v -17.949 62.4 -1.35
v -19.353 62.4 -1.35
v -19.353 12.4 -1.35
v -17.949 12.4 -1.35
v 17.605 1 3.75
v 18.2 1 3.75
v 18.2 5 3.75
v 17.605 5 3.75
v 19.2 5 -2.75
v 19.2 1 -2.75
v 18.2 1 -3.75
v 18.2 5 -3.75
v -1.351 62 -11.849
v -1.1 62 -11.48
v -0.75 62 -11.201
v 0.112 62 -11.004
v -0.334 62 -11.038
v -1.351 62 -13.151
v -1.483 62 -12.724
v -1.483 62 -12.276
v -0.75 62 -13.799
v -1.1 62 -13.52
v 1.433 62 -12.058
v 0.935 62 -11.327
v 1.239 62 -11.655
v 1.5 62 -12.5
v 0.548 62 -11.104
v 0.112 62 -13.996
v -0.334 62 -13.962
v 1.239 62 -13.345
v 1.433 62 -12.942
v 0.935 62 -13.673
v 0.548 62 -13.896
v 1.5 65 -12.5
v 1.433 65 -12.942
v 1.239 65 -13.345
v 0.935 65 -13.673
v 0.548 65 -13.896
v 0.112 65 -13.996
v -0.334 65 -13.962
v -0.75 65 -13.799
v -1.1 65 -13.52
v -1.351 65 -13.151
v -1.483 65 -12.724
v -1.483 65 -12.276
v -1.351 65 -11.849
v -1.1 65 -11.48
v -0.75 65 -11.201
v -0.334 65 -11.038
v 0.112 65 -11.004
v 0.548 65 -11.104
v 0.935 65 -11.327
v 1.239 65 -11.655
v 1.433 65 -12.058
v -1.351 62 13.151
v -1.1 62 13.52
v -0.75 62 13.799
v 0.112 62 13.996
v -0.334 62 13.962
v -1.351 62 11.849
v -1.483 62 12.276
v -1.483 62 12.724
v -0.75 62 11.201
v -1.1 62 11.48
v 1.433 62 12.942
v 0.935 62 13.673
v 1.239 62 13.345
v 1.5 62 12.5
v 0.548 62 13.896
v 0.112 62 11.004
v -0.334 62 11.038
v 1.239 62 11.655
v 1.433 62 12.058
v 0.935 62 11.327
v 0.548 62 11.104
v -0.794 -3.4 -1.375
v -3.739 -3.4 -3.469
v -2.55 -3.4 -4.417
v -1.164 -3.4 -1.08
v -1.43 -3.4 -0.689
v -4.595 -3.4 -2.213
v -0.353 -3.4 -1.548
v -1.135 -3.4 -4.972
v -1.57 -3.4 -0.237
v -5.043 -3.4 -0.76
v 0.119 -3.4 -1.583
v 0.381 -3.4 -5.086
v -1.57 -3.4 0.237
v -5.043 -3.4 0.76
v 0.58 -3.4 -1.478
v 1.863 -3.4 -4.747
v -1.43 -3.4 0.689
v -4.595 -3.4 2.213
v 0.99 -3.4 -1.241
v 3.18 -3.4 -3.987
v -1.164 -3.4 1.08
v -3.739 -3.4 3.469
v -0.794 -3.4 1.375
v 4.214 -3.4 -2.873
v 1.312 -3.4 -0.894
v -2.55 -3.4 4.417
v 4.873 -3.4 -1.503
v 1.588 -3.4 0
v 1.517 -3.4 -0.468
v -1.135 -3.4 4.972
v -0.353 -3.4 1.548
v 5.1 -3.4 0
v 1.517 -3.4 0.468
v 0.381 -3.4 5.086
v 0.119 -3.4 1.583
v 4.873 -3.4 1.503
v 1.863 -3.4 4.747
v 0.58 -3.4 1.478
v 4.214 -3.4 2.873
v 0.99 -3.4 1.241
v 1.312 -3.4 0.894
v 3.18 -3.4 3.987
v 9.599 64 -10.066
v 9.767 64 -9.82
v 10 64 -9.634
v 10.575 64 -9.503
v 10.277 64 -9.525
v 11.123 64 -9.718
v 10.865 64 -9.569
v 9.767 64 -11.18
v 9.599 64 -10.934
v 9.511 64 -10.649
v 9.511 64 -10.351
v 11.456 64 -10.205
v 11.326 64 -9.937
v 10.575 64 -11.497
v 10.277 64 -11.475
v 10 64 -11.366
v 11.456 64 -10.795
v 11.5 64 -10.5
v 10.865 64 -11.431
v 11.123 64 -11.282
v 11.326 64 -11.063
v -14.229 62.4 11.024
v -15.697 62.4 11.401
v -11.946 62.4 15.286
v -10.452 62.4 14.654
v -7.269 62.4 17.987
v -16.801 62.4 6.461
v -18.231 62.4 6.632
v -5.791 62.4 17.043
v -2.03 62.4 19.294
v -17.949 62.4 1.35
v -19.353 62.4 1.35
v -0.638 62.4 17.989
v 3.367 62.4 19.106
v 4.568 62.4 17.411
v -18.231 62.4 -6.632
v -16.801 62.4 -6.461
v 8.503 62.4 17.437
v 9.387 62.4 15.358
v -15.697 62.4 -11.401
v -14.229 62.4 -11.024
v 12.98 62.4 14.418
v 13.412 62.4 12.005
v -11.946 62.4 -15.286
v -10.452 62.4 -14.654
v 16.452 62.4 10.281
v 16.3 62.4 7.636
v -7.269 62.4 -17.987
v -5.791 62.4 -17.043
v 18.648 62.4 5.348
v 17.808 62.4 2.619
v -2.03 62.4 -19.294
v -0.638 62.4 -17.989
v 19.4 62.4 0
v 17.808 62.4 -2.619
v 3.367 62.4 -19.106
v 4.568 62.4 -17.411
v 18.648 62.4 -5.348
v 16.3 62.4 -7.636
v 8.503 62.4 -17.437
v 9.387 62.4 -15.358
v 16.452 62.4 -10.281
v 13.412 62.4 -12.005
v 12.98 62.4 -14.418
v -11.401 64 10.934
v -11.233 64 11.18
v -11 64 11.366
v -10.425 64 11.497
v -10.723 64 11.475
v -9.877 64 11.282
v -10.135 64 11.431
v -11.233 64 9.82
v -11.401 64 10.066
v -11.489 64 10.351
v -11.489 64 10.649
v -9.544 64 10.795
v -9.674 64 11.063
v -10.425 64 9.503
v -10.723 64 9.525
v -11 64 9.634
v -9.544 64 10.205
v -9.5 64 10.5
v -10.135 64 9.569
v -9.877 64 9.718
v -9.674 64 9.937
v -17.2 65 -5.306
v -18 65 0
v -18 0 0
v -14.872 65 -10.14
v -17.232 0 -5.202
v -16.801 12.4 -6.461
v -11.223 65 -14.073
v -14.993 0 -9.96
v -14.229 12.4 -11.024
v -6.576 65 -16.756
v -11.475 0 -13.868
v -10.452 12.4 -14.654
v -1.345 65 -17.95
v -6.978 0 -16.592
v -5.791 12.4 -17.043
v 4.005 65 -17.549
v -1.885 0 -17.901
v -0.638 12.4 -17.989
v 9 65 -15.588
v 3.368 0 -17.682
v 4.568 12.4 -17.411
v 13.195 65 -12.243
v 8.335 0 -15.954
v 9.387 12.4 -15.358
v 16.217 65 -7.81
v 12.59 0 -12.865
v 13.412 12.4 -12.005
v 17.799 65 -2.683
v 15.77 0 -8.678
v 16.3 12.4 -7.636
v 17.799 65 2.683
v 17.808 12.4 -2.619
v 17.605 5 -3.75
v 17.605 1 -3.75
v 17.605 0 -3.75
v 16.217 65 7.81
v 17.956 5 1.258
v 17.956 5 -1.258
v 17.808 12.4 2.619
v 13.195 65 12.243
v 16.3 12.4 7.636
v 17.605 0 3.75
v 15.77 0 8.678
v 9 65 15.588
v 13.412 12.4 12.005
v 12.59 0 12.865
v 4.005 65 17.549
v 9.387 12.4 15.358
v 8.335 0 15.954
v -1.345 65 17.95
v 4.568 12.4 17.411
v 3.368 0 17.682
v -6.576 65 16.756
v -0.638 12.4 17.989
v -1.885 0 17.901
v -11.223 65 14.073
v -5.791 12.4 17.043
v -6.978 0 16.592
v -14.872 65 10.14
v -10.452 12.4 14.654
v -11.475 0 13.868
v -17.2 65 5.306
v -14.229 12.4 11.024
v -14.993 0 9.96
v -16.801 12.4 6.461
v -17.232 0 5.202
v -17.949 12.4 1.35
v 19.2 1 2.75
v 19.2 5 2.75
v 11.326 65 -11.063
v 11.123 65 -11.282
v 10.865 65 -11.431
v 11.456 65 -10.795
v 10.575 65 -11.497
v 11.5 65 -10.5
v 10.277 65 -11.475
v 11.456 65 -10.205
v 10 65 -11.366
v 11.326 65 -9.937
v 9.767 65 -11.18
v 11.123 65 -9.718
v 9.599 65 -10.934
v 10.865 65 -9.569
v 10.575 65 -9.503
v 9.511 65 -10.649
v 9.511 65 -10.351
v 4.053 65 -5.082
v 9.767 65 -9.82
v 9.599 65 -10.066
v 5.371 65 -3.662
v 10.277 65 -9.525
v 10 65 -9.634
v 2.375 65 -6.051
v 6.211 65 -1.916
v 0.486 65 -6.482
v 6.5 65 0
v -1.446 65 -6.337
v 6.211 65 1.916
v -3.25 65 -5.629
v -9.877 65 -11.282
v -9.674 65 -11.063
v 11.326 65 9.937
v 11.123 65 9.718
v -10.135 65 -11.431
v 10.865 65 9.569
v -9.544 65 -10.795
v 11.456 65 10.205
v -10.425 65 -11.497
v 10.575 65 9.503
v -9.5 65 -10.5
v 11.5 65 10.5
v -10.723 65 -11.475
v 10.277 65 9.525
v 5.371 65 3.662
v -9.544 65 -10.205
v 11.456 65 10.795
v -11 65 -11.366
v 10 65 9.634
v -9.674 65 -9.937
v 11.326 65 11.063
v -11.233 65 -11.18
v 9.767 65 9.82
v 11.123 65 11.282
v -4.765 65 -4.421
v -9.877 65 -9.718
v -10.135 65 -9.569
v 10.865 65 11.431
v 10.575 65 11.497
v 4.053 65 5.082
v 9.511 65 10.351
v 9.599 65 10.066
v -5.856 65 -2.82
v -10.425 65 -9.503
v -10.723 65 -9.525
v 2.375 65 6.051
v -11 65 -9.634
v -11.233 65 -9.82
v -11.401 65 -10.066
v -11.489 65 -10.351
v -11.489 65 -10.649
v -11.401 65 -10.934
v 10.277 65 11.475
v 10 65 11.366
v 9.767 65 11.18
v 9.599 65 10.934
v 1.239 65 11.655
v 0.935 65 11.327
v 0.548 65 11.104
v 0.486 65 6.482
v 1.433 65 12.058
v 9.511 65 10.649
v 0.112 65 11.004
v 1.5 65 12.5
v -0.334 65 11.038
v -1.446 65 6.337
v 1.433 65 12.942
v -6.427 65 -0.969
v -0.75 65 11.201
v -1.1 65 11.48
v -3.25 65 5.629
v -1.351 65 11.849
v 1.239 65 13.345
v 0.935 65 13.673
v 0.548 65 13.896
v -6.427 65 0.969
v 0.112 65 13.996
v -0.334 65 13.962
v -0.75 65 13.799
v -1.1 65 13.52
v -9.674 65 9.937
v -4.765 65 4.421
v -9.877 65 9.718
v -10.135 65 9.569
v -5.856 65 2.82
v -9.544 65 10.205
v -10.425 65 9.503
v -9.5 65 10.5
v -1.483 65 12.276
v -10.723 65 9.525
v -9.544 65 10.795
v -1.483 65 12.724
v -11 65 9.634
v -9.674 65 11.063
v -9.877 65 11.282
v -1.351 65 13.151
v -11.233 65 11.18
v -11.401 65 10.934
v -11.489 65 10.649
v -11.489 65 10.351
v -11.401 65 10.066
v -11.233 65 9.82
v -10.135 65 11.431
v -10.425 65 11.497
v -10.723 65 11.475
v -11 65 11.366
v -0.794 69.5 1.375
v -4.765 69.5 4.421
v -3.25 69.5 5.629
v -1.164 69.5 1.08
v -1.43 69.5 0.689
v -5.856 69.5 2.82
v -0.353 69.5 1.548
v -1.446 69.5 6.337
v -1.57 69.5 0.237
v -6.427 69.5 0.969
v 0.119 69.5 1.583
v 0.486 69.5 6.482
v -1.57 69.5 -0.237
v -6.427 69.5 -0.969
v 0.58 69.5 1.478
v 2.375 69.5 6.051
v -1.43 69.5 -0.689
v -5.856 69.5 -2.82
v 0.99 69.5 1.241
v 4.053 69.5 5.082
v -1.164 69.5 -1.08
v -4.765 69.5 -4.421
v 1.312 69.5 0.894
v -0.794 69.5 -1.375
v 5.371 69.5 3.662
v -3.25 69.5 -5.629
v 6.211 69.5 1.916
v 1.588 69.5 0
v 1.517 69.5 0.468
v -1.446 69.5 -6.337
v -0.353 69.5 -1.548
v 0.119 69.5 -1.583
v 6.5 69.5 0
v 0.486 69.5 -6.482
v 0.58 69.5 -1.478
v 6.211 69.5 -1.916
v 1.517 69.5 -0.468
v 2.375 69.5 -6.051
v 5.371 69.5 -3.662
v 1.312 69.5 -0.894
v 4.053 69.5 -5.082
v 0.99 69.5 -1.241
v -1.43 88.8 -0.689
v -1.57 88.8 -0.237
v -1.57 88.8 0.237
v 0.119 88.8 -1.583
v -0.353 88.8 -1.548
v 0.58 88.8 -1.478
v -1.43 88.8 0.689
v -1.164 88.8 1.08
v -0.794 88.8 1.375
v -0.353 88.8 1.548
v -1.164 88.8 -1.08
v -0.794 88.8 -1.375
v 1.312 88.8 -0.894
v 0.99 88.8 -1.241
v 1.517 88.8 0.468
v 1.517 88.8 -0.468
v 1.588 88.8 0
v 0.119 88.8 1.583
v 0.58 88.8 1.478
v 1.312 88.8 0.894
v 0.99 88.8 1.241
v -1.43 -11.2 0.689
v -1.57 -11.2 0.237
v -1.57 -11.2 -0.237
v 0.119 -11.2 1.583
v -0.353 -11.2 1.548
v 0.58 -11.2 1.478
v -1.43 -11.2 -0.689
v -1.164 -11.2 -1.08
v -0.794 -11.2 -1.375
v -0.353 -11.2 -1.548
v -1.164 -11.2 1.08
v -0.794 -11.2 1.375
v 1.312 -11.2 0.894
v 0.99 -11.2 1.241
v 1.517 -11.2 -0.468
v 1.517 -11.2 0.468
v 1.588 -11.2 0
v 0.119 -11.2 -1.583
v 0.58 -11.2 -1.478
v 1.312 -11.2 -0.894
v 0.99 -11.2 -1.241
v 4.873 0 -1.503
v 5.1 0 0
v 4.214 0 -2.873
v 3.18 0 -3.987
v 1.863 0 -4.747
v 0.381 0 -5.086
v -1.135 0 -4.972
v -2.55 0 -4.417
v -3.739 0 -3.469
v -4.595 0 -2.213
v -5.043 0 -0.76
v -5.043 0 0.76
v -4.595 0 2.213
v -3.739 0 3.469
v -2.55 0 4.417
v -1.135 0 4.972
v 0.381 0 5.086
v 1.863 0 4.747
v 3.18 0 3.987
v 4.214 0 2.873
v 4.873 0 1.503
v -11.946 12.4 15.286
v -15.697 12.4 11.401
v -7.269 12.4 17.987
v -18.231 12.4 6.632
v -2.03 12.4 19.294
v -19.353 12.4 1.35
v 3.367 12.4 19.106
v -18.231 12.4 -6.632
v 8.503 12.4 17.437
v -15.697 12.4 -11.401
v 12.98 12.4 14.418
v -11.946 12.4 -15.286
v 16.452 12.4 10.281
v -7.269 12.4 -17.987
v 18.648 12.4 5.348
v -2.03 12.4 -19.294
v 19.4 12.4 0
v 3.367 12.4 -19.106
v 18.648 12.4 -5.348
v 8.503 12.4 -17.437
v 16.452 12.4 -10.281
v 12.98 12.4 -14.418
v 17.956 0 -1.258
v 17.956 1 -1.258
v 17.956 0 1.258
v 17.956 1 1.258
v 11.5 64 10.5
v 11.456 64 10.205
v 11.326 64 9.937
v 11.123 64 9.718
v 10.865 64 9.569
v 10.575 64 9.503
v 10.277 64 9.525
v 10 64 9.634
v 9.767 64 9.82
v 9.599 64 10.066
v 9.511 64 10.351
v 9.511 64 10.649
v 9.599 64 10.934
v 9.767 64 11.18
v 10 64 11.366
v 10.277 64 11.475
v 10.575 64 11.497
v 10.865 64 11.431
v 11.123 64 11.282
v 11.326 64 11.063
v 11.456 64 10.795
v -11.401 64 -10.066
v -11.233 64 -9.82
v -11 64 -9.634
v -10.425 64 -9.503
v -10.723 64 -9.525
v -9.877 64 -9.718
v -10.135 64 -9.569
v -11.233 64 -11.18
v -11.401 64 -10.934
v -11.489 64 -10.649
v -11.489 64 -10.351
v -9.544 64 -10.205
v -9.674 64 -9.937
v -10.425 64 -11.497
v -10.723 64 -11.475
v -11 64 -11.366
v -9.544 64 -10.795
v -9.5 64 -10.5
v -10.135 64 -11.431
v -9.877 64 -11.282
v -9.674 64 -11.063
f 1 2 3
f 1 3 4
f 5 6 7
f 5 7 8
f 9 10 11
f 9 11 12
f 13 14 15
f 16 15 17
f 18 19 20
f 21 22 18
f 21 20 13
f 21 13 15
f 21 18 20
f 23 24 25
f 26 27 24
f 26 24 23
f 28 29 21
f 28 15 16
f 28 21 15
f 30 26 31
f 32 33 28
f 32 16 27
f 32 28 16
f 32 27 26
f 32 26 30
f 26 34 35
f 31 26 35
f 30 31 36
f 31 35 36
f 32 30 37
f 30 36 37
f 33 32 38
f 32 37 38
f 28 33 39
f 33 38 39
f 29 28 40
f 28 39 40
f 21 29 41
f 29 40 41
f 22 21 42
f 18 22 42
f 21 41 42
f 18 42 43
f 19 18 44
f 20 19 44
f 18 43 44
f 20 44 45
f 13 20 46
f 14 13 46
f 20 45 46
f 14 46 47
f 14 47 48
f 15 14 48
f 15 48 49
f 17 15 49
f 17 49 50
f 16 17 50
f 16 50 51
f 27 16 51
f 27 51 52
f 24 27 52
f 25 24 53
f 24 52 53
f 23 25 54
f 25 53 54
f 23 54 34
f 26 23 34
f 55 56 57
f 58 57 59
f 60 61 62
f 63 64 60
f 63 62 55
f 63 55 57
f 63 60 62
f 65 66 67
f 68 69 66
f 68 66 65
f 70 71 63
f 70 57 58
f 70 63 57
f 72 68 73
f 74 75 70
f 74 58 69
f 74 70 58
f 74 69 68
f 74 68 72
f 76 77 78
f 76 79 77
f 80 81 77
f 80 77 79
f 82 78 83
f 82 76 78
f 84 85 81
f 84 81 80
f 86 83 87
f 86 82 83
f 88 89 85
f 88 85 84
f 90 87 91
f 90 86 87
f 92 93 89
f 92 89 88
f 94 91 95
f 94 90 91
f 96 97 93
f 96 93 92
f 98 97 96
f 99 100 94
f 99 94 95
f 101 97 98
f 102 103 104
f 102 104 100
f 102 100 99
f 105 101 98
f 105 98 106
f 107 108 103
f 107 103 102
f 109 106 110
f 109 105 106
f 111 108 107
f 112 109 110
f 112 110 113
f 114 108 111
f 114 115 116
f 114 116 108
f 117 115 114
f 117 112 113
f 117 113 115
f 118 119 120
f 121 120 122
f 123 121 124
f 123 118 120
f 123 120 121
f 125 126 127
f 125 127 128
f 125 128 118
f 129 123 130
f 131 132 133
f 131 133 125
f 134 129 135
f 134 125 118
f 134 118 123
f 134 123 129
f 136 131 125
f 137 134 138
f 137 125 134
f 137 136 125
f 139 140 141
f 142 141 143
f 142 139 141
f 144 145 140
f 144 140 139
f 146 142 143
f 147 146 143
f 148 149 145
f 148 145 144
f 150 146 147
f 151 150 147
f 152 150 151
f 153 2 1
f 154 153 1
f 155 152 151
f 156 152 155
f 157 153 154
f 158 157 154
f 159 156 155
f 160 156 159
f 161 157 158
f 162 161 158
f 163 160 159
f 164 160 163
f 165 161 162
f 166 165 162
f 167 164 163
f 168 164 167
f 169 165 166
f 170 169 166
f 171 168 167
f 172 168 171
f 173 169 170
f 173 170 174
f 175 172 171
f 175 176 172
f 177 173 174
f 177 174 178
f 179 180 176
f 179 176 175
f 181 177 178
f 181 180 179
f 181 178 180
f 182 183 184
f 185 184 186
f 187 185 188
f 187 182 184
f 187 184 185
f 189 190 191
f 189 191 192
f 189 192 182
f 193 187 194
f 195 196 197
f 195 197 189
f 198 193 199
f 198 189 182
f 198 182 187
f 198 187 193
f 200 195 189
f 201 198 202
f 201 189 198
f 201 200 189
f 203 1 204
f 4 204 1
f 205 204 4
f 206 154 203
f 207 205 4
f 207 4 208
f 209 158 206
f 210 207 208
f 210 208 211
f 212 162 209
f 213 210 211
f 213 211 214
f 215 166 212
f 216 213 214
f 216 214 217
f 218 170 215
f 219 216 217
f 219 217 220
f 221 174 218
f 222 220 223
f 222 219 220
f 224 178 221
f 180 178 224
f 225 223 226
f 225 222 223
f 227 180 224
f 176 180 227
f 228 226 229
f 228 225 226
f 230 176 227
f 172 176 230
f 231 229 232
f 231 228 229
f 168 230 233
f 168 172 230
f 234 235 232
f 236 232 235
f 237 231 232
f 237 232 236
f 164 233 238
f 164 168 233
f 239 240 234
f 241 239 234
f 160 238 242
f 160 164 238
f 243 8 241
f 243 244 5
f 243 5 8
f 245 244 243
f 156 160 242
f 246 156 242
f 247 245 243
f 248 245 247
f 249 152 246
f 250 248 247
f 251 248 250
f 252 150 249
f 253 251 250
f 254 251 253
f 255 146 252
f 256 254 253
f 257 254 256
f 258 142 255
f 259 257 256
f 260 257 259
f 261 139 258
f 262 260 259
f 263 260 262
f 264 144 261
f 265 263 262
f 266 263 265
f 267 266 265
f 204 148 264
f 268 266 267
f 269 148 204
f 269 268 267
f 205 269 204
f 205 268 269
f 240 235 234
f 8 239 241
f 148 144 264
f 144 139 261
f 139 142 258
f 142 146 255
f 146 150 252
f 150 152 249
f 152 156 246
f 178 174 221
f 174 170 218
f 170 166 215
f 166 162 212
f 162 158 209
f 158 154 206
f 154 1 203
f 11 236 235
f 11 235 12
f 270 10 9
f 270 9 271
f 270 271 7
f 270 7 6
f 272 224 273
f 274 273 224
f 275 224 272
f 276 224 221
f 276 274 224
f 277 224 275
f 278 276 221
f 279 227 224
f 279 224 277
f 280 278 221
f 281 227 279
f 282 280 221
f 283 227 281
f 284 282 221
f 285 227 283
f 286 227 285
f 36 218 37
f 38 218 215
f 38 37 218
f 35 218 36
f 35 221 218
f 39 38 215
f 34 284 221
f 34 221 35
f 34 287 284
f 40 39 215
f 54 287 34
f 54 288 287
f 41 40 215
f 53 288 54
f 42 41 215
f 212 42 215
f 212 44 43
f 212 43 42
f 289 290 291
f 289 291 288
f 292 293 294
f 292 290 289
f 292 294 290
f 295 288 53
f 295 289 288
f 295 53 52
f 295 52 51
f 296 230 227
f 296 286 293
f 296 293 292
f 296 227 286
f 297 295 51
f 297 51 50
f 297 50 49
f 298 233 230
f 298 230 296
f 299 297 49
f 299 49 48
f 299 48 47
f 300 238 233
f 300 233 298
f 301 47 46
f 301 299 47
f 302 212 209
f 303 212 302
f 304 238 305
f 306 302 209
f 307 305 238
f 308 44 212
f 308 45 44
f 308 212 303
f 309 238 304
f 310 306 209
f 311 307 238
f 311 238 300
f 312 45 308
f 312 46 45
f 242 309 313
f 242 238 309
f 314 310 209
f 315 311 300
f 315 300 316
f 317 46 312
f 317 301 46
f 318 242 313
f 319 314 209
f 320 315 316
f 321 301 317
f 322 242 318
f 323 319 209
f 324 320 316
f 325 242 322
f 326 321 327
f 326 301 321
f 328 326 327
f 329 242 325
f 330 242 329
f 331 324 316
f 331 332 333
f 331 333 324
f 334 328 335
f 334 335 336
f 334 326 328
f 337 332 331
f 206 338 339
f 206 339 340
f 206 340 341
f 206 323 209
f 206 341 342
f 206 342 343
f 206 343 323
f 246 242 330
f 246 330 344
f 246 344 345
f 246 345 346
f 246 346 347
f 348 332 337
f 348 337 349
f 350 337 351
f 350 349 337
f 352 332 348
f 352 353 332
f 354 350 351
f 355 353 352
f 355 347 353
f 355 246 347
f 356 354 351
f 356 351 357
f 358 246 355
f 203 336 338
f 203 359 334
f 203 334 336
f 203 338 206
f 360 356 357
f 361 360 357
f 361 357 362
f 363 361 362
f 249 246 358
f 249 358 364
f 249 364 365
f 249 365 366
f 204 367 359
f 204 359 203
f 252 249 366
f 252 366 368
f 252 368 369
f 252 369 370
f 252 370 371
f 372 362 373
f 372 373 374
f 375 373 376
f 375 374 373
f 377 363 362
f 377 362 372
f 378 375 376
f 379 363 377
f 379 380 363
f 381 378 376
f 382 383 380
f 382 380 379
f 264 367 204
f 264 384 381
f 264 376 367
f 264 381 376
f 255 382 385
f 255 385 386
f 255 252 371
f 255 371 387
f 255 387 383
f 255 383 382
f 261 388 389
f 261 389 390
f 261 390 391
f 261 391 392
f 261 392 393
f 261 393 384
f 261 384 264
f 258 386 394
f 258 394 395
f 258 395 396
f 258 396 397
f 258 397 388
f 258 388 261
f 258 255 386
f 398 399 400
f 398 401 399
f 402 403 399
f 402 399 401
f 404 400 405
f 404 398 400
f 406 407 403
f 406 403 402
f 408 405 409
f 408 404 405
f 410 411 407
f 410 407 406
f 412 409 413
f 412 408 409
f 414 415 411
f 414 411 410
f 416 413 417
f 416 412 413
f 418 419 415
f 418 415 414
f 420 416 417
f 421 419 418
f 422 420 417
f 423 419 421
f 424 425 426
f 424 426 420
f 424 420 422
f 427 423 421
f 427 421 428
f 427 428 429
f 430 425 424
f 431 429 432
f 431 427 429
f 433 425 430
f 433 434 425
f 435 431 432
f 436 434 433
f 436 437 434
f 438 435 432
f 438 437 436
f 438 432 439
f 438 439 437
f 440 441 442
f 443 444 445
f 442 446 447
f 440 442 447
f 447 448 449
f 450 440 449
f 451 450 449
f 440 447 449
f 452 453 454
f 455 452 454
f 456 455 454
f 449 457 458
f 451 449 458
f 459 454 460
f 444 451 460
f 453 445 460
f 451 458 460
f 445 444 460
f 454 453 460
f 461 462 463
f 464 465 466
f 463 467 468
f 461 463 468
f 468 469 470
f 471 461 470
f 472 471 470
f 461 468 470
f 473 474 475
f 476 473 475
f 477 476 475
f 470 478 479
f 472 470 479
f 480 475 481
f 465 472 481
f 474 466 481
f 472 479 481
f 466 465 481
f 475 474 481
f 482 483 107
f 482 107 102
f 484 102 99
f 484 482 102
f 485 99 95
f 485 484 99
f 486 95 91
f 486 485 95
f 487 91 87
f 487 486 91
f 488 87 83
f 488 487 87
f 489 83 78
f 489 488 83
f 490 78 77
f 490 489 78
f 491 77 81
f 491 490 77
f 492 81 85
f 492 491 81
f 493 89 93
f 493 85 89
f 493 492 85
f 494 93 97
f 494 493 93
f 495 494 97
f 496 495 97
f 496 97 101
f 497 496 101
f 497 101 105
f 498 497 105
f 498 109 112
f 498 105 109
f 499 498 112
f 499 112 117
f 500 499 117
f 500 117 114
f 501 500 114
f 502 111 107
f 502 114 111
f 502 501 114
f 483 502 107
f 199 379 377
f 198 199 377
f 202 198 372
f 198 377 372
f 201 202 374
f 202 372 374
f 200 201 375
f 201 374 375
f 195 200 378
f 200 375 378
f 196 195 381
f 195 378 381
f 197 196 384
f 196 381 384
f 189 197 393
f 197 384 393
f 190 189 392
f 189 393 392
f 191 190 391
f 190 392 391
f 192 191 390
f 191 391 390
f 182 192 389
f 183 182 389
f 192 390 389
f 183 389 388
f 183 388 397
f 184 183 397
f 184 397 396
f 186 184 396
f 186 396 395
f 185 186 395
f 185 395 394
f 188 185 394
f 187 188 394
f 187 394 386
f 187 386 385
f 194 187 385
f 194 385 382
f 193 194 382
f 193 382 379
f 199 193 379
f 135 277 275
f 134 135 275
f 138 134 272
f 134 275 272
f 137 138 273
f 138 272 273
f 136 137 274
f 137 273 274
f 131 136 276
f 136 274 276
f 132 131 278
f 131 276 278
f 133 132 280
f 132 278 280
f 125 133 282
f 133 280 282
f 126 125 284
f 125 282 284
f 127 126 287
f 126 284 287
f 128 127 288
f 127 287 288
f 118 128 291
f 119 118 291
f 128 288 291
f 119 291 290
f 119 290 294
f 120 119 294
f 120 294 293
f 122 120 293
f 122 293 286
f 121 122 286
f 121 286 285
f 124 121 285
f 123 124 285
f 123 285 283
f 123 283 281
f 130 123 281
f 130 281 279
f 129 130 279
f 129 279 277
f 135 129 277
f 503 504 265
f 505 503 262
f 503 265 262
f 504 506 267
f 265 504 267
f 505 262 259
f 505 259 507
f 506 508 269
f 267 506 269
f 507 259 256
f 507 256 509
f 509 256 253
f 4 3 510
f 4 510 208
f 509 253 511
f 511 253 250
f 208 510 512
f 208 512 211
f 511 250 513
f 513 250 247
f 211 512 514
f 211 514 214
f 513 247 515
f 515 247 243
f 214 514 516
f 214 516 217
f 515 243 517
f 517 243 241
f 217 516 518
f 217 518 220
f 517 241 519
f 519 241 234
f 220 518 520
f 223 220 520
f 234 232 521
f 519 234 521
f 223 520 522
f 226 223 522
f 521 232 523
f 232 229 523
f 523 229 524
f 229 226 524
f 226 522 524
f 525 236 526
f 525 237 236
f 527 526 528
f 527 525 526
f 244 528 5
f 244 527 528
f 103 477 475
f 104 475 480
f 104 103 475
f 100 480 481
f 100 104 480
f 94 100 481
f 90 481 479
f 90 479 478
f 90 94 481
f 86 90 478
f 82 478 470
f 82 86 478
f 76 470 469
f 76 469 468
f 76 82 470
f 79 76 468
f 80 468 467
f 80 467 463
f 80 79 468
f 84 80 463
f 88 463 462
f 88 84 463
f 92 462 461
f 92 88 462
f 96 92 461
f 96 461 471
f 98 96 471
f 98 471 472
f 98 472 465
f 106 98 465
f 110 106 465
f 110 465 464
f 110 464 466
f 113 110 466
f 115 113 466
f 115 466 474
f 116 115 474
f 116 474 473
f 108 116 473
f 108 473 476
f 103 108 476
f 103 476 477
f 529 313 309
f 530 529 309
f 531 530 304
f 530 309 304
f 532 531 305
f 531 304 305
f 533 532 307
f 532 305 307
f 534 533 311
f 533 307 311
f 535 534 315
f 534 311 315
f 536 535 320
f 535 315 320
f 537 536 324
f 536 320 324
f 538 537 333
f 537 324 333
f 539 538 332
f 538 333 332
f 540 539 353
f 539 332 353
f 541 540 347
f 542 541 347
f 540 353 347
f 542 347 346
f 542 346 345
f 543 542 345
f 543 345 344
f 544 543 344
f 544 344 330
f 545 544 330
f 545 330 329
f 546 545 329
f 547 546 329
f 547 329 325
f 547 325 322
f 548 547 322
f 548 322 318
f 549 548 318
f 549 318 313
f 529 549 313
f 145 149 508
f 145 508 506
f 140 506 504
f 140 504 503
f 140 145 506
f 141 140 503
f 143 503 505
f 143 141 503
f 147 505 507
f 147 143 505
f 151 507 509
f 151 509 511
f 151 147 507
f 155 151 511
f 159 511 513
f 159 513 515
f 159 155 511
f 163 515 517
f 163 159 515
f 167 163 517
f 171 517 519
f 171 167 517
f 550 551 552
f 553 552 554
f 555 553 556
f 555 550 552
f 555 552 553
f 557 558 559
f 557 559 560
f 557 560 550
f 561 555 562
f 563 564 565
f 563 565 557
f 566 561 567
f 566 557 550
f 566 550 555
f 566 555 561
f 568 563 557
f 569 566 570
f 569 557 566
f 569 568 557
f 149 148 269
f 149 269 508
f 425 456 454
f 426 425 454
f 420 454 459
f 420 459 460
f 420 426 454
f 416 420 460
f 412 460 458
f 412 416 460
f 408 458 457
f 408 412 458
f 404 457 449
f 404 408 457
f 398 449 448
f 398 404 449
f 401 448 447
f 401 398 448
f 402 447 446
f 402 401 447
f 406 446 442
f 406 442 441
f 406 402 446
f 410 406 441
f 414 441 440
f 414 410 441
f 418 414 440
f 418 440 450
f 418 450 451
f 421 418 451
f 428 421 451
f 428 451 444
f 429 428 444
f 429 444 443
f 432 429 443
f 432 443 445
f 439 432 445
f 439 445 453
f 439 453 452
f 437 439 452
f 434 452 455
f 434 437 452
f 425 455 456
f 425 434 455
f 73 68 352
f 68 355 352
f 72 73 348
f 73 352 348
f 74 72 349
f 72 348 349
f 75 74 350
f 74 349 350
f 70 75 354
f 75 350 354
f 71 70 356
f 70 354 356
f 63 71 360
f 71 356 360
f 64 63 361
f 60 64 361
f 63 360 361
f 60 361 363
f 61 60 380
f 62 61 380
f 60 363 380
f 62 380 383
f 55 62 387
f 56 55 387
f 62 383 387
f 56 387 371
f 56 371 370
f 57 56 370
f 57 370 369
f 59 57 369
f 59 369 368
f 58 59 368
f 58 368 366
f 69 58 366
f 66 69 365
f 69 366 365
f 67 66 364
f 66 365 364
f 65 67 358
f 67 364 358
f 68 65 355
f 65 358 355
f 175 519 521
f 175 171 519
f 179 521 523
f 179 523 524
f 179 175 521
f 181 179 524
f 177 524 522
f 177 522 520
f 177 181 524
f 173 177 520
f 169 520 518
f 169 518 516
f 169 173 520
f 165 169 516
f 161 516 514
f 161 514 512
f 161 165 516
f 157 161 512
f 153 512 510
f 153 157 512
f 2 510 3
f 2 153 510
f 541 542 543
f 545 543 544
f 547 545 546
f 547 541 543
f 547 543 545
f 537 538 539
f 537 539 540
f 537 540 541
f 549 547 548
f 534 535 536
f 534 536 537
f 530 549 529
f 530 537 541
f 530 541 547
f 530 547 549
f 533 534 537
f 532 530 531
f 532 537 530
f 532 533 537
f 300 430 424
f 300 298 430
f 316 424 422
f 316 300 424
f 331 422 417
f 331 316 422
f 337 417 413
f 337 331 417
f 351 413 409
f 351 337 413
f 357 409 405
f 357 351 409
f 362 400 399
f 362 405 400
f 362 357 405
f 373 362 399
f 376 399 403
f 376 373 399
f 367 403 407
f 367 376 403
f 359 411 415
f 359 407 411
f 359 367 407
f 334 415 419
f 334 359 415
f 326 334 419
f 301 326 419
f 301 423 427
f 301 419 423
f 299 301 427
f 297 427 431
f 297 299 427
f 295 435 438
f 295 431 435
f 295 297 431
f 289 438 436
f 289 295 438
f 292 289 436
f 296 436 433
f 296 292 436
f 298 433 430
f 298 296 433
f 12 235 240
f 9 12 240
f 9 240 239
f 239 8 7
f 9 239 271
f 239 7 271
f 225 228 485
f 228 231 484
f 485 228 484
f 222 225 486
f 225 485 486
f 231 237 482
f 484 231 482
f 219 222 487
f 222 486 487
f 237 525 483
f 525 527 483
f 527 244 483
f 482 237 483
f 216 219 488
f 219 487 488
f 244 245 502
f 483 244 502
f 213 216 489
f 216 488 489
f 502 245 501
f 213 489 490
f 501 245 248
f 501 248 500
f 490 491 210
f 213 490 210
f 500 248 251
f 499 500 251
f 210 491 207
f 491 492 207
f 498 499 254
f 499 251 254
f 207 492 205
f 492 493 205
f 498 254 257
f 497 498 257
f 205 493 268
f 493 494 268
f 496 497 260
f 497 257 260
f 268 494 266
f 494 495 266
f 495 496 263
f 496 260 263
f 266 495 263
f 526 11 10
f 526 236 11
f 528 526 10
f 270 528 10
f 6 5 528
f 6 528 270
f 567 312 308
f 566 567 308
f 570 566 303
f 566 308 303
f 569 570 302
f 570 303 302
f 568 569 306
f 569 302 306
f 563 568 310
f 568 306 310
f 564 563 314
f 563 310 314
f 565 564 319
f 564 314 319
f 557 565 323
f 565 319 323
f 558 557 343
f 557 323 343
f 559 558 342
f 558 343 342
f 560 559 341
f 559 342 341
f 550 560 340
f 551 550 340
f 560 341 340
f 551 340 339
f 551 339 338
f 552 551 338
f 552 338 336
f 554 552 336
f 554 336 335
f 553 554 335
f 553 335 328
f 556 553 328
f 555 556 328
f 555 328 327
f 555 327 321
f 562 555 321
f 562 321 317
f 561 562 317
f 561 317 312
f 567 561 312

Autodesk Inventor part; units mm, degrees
ref_plane "YZ Plane" through (0, 0, 0) normal (1, 0, 0) x (0, 1, 0)
ref_plane "XZ Plane" through (0, 0, 0) normal (0, 1, 0) x (-1, 0, 0)
sketch "Sketch1" plane through (0, 0, 0) normal (0, 1, 0) x (-1, 0, 0)
  circle A0 centre (0, 0) radius 18
  dimension "d0" = 36
extrude "Extrusion1" add sketch "Sketch1" along normal blind 65
ref_plane "Work Plane1" through (0, 62.4, 0) normal (0, 1, 0) x (1, 0, 0)
sketch "Sketch2" plane through (0, 62.4, 0) normal (0, 1, 0) x (1, 0, 0)
  circle A0 centre (0, 0) radius 18 projected
  circle A1 centre (0, 0) radius 19.4
  line L0 (-15.5, -1.35) -> (-20.5, -1.35)
  line L1 (-20.5, -1.35) -> (-20.5, 1.35)
  line L2 (-20.5, 1.35) -> (-15.5, 1.35)
  line L3 (-15.5, 1.35) -> (-15.5, -1.35)
  circle A2 centre (0, 0) radius 18 projected
  line L4 (-15.5, -1.35) -> (-20.5, 1.35) construction
  line L5 (-20.5, -1.35) -> (-15.5, 1.35) construction
  point P0 (-18, 0)
  point P1 (-19.353, 1.35)
  point P2 (-17.9493, 1.35)
  point P3 (-17.9493, -1.35)
  point P4 (-19.353, -1.35)
  dimension "d4" = 38.8
  dimension "d5" = 5
  dimension "d6" = 2.7
extrude "Extrusion2" add sketch "Sketch2" against normal blind 50 contours A0 L2 A1 L0 picked at (18.5875, 2.9161)
sketch "Sketch3" plane through (0, 65, 0) normal (0, 1, 0) x (1, 0, 0)
  circle A0 centre (0, 0) radius 18 projected
  circle A1 centre (0, 0) radius 6.5
  dimension "d9" = 13
extrude "Extrusion3" add sketch "Sketch3" along normal blind 4.5 contours A1
sketch "Sketch4" plane through (0, 0, 0) normal (0, -1, 0) x (1, 0, 0)
  circle A0 centre (0, 0) radius 18 projected
  circle A1 centre (0, 0) radius 5.1
  dimension "d12" = 10.2
extrude "Extrusion4" add sketch "Sketch4" along normal blind 3.4 contours A1
sketch "Sketch5" plane through (0, 65, 0) normal (0, 1, 0) x (1, 0, 0)
  circle A0 centre (0, 0) radius 6.5 projected
  circle A1 centre (0, 0) radius 18 projected
  line L0 (0, 0) -> (0, -12.5)
  line L1 (0, 0) -> (0, 12.5)
  circle A2 centre (0, -12.5) radius 1.5
  circle A3 centre (0, 12.5) radius 1.5
  dimension "d15" = 12.5
  dimension "d16" = 12.5
  dimension "d17" = 3
  dimension "d18" = 3
extrude "Extrusion5" cut sketch "Sketch5" against normal blind 3 contours A2 | A3
sketch "Sketch6" plane through (0, 65, 0) normal (0, 1, 0) x (1, 0, 0)
  circle A0 centre (0, 0) radius 6.5 projected
  line L0 (10.5, 10.5) -> (-10.5, 10.5)
  line L1 (-10.5, 10.5) -> (-10.5, -10.5)
  line L2 (-10.5, -10.5) -> (10.5, -10.5)
  line L3 (10.5, -10.5) -> (10.5, 10.5)
  circle A1 centre (0, 0) radius 5.1 projected
  line L4 (10.5, 10.5) -> (-10.5, -10.5) construction
  line L5 (-10.5, 10.5) -> (10.5, -10.5) construction
  circle A2 centre (10.5, -10.5) radius 1
  circle A3 centre (-10.5, -10.5) radius 1
  circle A4 centre (-10.5, 10.5) radius 1
  circle A5 centre (10.5, 10.5) radius 1
  dimension "d21" = 21
  dimension "d22" = 21
  dimension "d23" = 2
  dimension "d24" = 2
  dimension "d25" = 2
  dimension "d26" = 2
extrude "Extrusion6" cut sketch "Sketch6" against normal blind 1 contours A4 L1 L0 | L0 L1 A4 | A5 L3 L0 | L0 L3 A5 | A3 L2 L1 | L1 L2 A3 | A2 L2 L3 | L3 L2 A2
sketch "Sketch7" plane through (0, 65, 0) normal (0, 1, 0) x (1, 0, 0)
  circle A0 centre (0, 0) radius 6.5 projected
  circle A1 centre (0, 0) radius 1.5875
  dimension "d29" = 3.175
extrude "Extrusion7" add sketch "Sketch7" against normal blind 76.2 contours A1
sketch "Sketch8" plane through (0, -11.2, 0) normal (0, -1, 0) x (1, 0, 0)
  circle A0 centre (0, 0) radius 1.5875 projected
extrude "Extrusion8" add sketch "Sketch8" against normal blind 100
sketch "Sketch9" plane through (0, 0, 0) normal (0, -1, 0) x (1, 0, 0)
  circle A0 centre (0, 0) radius 5.1 projected
  circle A1 centre (0, 0) radius 18 projected
  circle A2 centre (0, 0) radius 1.5875 projected
  line L0 (0, 0) -> (19.2, 0)
  line L1 (16.8, -3.75) -> (19.2, -3.75)
  line L2 (19.2, -3.75) -> (19.2, 3.75)
  line L3 (19.2, 3.75) -> (16.8, 3.75)
  line L4 (16.8, 3.75) -> (16.8, -3.75)
  circle A3 centre (0, 0) radius 18 projected
  line L5 (16.8, -3.75) -> (19.2, 3.75) construction
  line L6 (19.2, -3.75) -> (16.8, 3.75) construction
  point P0 (18, 0)
  dimension "d34" = 19.2
  dimension "d35" = 2.4
  dimension "d36" = 7.5
extrude "Extrusion9" add sketch "Sketch9" against normal blind 5 contours L4 L3 A1 L0 | L0 A1 L1 L4 | L0 L2 L1 A1 | A1 L3 L2 L0
chamfer "Chamfer1" distance 1 angle 45 2 edges at (19.2, 2.5, -3.75) (19.2, 2.5, 3.75)
sketch "Sketch10" plane through (0, 0, 0) normal (0, -1, 0) x (1, 0, 0)
  line L0 (19.2, 2.75) -> (18.2, 3.75) projected
  line L1 (19.2, 2.75) -> (19.2, -2.75) projected
  line L2 (18.2, -3.75) -> (19.2, -2.75) projected
  line L3 (18.2, -3.75) -> (17.605, -3.75) projected
  arc A0 (17.605, -3.75) -> (17.605, 3.75) centre (0, 0) ccw projected
  line L4 (17.605, 3.75) -> (18.2, 3.75) projected
extrude "Extrusion10" cut sketch "Sketch10" against normal blind 1
properties part number "motor_1"
